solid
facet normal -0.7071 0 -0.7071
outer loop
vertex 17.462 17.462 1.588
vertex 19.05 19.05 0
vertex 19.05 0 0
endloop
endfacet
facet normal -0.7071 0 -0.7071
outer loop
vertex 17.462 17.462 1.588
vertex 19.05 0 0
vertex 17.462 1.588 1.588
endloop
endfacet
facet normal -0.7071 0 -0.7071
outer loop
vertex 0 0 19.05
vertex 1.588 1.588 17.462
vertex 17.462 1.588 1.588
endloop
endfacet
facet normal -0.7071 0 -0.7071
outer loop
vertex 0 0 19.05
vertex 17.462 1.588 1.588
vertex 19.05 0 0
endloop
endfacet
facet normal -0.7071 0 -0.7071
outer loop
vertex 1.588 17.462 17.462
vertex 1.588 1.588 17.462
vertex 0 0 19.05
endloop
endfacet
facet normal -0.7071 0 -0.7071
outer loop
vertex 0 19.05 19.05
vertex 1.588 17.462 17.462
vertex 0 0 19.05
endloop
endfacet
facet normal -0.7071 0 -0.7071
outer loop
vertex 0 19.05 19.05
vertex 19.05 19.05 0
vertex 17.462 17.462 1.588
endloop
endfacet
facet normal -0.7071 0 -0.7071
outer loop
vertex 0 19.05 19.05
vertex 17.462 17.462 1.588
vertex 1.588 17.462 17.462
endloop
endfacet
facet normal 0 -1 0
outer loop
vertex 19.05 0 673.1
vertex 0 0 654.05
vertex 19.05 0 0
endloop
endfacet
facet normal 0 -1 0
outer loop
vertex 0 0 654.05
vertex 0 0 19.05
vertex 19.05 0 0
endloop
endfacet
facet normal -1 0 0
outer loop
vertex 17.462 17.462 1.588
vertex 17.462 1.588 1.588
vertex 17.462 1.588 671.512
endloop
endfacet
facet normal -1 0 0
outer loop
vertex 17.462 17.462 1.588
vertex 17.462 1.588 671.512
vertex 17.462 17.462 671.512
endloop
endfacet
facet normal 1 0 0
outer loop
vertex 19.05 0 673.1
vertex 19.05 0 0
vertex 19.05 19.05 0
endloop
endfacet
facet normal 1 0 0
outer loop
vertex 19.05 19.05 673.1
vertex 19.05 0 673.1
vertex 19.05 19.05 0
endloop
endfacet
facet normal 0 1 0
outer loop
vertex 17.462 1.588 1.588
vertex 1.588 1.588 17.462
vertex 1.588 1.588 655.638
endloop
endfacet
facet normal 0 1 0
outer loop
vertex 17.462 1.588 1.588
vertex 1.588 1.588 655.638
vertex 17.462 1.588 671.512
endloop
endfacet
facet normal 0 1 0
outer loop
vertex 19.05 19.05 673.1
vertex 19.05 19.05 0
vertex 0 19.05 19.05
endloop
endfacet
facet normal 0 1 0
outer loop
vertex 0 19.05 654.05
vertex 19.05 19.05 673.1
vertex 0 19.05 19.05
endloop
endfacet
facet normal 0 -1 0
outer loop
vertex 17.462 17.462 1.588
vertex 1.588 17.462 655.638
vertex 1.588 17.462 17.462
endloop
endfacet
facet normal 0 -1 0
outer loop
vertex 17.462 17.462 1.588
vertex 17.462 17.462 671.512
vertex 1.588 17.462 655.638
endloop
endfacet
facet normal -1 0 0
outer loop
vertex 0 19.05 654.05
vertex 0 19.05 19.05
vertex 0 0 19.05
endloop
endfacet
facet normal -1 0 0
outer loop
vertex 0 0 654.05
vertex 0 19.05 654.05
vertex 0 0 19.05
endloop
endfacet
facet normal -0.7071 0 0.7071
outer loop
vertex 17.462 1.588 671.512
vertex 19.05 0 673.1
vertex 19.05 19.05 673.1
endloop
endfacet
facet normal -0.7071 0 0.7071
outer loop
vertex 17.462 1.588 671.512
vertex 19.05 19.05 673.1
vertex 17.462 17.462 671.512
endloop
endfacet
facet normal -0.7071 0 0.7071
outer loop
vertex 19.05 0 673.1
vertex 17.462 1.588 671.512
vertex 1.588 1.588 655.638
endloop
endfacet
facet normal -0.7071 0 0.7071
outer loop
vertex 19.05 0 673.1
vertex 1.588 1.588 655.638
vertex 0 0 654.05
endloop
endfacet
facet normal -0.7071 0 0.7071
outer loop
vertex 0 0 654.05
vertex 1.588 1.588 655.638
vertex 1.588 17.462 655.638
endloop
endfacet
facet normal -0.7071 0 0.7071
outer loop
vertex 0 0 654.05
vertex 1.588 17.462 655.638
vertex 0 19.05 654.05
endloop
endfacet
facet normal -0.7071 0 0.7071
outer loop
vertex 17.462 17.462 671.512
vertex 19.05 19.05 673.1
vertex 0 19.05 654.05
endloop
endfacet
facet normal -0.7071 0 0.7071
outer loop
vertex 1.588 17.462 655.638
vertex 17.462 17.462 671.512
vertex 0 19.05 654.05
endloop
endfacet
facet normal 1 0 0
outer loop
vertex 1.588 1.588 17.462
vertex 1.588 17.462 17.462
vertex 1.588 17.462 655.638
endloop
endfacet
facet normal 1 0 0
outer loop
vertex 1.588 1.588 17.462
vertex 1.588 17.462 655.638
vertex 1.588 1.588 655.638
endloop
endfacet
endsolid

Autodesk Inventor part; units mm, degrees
ref_plane "YZ Plane" through (0, 0, 0) normal (1, 0, 0) x (0, 1, 0)
ref_plane "XZ Plane" through (0, 0, 0) normal (0, 1, 0) x (-1, 0, 0)
ref_plane "XY Plane" through (0, 0, 0) normal (0, 0, 1) x (1, 0, 0)
sketch "Sketch1" plane through (0, 0, 0) normal (0, 0, 1) x (1, 0, 0)
  line L0 (0, 0) -> (19.05, 0)
  line L1 (19.05, 0) -> (19.05, 19.05)
  line L2 (19.05, 19.05) -> (0, 19.05)
  line L3 (0, 19.05) -> (0, 0)
  line L4 (17.4625, 17.4625) -> (1.5875, 17.4625)
  line L5 (1.5875, 17.4625) -> (1.5875, 1.5875)
  line L6 (1.5875, 1.5875) -> (17.4625, 1.5875)
  line L7 (17.4625, 1.5875) -> (17.4625, 17.4625)
  dimension "d0" = 19.05
  dimension "d1" = 19.05
  dimension "d2" = 1.5875
  dimension "d3" = 1.5875
  dimension "d4" = 1.5875
  dimension "d5" = 1.5875
extrude "Extrusion1" add sketch "Sketch1" along normal blind 673.1
sketch "Sketch2" plane through (0, 19.05, 0) normal (0, 1, 0) x (1, 0, 0)
  line L0 (19.05, 0) -> (0, 0) projected
  line L1 (0, 0) -> (0, -673.1) projected
  line L2 (19.05, -673.1) -> (0, -673.1) projected
  line L3 (19.05, -673.1) -> (0, -654.05)
  line L4 (19.05, 0) -> (0, -19.05)
  dimension "d8" = 45
  dimension "d9" = 45
extrude "Extrusion2" cut sketch "Sketch2" against normal through all
equation "\"d3\" = d2"
equation "\"d4\" = d2"
equation "\"d5\" = d3"
properties part number "Bumper Rail Side"
